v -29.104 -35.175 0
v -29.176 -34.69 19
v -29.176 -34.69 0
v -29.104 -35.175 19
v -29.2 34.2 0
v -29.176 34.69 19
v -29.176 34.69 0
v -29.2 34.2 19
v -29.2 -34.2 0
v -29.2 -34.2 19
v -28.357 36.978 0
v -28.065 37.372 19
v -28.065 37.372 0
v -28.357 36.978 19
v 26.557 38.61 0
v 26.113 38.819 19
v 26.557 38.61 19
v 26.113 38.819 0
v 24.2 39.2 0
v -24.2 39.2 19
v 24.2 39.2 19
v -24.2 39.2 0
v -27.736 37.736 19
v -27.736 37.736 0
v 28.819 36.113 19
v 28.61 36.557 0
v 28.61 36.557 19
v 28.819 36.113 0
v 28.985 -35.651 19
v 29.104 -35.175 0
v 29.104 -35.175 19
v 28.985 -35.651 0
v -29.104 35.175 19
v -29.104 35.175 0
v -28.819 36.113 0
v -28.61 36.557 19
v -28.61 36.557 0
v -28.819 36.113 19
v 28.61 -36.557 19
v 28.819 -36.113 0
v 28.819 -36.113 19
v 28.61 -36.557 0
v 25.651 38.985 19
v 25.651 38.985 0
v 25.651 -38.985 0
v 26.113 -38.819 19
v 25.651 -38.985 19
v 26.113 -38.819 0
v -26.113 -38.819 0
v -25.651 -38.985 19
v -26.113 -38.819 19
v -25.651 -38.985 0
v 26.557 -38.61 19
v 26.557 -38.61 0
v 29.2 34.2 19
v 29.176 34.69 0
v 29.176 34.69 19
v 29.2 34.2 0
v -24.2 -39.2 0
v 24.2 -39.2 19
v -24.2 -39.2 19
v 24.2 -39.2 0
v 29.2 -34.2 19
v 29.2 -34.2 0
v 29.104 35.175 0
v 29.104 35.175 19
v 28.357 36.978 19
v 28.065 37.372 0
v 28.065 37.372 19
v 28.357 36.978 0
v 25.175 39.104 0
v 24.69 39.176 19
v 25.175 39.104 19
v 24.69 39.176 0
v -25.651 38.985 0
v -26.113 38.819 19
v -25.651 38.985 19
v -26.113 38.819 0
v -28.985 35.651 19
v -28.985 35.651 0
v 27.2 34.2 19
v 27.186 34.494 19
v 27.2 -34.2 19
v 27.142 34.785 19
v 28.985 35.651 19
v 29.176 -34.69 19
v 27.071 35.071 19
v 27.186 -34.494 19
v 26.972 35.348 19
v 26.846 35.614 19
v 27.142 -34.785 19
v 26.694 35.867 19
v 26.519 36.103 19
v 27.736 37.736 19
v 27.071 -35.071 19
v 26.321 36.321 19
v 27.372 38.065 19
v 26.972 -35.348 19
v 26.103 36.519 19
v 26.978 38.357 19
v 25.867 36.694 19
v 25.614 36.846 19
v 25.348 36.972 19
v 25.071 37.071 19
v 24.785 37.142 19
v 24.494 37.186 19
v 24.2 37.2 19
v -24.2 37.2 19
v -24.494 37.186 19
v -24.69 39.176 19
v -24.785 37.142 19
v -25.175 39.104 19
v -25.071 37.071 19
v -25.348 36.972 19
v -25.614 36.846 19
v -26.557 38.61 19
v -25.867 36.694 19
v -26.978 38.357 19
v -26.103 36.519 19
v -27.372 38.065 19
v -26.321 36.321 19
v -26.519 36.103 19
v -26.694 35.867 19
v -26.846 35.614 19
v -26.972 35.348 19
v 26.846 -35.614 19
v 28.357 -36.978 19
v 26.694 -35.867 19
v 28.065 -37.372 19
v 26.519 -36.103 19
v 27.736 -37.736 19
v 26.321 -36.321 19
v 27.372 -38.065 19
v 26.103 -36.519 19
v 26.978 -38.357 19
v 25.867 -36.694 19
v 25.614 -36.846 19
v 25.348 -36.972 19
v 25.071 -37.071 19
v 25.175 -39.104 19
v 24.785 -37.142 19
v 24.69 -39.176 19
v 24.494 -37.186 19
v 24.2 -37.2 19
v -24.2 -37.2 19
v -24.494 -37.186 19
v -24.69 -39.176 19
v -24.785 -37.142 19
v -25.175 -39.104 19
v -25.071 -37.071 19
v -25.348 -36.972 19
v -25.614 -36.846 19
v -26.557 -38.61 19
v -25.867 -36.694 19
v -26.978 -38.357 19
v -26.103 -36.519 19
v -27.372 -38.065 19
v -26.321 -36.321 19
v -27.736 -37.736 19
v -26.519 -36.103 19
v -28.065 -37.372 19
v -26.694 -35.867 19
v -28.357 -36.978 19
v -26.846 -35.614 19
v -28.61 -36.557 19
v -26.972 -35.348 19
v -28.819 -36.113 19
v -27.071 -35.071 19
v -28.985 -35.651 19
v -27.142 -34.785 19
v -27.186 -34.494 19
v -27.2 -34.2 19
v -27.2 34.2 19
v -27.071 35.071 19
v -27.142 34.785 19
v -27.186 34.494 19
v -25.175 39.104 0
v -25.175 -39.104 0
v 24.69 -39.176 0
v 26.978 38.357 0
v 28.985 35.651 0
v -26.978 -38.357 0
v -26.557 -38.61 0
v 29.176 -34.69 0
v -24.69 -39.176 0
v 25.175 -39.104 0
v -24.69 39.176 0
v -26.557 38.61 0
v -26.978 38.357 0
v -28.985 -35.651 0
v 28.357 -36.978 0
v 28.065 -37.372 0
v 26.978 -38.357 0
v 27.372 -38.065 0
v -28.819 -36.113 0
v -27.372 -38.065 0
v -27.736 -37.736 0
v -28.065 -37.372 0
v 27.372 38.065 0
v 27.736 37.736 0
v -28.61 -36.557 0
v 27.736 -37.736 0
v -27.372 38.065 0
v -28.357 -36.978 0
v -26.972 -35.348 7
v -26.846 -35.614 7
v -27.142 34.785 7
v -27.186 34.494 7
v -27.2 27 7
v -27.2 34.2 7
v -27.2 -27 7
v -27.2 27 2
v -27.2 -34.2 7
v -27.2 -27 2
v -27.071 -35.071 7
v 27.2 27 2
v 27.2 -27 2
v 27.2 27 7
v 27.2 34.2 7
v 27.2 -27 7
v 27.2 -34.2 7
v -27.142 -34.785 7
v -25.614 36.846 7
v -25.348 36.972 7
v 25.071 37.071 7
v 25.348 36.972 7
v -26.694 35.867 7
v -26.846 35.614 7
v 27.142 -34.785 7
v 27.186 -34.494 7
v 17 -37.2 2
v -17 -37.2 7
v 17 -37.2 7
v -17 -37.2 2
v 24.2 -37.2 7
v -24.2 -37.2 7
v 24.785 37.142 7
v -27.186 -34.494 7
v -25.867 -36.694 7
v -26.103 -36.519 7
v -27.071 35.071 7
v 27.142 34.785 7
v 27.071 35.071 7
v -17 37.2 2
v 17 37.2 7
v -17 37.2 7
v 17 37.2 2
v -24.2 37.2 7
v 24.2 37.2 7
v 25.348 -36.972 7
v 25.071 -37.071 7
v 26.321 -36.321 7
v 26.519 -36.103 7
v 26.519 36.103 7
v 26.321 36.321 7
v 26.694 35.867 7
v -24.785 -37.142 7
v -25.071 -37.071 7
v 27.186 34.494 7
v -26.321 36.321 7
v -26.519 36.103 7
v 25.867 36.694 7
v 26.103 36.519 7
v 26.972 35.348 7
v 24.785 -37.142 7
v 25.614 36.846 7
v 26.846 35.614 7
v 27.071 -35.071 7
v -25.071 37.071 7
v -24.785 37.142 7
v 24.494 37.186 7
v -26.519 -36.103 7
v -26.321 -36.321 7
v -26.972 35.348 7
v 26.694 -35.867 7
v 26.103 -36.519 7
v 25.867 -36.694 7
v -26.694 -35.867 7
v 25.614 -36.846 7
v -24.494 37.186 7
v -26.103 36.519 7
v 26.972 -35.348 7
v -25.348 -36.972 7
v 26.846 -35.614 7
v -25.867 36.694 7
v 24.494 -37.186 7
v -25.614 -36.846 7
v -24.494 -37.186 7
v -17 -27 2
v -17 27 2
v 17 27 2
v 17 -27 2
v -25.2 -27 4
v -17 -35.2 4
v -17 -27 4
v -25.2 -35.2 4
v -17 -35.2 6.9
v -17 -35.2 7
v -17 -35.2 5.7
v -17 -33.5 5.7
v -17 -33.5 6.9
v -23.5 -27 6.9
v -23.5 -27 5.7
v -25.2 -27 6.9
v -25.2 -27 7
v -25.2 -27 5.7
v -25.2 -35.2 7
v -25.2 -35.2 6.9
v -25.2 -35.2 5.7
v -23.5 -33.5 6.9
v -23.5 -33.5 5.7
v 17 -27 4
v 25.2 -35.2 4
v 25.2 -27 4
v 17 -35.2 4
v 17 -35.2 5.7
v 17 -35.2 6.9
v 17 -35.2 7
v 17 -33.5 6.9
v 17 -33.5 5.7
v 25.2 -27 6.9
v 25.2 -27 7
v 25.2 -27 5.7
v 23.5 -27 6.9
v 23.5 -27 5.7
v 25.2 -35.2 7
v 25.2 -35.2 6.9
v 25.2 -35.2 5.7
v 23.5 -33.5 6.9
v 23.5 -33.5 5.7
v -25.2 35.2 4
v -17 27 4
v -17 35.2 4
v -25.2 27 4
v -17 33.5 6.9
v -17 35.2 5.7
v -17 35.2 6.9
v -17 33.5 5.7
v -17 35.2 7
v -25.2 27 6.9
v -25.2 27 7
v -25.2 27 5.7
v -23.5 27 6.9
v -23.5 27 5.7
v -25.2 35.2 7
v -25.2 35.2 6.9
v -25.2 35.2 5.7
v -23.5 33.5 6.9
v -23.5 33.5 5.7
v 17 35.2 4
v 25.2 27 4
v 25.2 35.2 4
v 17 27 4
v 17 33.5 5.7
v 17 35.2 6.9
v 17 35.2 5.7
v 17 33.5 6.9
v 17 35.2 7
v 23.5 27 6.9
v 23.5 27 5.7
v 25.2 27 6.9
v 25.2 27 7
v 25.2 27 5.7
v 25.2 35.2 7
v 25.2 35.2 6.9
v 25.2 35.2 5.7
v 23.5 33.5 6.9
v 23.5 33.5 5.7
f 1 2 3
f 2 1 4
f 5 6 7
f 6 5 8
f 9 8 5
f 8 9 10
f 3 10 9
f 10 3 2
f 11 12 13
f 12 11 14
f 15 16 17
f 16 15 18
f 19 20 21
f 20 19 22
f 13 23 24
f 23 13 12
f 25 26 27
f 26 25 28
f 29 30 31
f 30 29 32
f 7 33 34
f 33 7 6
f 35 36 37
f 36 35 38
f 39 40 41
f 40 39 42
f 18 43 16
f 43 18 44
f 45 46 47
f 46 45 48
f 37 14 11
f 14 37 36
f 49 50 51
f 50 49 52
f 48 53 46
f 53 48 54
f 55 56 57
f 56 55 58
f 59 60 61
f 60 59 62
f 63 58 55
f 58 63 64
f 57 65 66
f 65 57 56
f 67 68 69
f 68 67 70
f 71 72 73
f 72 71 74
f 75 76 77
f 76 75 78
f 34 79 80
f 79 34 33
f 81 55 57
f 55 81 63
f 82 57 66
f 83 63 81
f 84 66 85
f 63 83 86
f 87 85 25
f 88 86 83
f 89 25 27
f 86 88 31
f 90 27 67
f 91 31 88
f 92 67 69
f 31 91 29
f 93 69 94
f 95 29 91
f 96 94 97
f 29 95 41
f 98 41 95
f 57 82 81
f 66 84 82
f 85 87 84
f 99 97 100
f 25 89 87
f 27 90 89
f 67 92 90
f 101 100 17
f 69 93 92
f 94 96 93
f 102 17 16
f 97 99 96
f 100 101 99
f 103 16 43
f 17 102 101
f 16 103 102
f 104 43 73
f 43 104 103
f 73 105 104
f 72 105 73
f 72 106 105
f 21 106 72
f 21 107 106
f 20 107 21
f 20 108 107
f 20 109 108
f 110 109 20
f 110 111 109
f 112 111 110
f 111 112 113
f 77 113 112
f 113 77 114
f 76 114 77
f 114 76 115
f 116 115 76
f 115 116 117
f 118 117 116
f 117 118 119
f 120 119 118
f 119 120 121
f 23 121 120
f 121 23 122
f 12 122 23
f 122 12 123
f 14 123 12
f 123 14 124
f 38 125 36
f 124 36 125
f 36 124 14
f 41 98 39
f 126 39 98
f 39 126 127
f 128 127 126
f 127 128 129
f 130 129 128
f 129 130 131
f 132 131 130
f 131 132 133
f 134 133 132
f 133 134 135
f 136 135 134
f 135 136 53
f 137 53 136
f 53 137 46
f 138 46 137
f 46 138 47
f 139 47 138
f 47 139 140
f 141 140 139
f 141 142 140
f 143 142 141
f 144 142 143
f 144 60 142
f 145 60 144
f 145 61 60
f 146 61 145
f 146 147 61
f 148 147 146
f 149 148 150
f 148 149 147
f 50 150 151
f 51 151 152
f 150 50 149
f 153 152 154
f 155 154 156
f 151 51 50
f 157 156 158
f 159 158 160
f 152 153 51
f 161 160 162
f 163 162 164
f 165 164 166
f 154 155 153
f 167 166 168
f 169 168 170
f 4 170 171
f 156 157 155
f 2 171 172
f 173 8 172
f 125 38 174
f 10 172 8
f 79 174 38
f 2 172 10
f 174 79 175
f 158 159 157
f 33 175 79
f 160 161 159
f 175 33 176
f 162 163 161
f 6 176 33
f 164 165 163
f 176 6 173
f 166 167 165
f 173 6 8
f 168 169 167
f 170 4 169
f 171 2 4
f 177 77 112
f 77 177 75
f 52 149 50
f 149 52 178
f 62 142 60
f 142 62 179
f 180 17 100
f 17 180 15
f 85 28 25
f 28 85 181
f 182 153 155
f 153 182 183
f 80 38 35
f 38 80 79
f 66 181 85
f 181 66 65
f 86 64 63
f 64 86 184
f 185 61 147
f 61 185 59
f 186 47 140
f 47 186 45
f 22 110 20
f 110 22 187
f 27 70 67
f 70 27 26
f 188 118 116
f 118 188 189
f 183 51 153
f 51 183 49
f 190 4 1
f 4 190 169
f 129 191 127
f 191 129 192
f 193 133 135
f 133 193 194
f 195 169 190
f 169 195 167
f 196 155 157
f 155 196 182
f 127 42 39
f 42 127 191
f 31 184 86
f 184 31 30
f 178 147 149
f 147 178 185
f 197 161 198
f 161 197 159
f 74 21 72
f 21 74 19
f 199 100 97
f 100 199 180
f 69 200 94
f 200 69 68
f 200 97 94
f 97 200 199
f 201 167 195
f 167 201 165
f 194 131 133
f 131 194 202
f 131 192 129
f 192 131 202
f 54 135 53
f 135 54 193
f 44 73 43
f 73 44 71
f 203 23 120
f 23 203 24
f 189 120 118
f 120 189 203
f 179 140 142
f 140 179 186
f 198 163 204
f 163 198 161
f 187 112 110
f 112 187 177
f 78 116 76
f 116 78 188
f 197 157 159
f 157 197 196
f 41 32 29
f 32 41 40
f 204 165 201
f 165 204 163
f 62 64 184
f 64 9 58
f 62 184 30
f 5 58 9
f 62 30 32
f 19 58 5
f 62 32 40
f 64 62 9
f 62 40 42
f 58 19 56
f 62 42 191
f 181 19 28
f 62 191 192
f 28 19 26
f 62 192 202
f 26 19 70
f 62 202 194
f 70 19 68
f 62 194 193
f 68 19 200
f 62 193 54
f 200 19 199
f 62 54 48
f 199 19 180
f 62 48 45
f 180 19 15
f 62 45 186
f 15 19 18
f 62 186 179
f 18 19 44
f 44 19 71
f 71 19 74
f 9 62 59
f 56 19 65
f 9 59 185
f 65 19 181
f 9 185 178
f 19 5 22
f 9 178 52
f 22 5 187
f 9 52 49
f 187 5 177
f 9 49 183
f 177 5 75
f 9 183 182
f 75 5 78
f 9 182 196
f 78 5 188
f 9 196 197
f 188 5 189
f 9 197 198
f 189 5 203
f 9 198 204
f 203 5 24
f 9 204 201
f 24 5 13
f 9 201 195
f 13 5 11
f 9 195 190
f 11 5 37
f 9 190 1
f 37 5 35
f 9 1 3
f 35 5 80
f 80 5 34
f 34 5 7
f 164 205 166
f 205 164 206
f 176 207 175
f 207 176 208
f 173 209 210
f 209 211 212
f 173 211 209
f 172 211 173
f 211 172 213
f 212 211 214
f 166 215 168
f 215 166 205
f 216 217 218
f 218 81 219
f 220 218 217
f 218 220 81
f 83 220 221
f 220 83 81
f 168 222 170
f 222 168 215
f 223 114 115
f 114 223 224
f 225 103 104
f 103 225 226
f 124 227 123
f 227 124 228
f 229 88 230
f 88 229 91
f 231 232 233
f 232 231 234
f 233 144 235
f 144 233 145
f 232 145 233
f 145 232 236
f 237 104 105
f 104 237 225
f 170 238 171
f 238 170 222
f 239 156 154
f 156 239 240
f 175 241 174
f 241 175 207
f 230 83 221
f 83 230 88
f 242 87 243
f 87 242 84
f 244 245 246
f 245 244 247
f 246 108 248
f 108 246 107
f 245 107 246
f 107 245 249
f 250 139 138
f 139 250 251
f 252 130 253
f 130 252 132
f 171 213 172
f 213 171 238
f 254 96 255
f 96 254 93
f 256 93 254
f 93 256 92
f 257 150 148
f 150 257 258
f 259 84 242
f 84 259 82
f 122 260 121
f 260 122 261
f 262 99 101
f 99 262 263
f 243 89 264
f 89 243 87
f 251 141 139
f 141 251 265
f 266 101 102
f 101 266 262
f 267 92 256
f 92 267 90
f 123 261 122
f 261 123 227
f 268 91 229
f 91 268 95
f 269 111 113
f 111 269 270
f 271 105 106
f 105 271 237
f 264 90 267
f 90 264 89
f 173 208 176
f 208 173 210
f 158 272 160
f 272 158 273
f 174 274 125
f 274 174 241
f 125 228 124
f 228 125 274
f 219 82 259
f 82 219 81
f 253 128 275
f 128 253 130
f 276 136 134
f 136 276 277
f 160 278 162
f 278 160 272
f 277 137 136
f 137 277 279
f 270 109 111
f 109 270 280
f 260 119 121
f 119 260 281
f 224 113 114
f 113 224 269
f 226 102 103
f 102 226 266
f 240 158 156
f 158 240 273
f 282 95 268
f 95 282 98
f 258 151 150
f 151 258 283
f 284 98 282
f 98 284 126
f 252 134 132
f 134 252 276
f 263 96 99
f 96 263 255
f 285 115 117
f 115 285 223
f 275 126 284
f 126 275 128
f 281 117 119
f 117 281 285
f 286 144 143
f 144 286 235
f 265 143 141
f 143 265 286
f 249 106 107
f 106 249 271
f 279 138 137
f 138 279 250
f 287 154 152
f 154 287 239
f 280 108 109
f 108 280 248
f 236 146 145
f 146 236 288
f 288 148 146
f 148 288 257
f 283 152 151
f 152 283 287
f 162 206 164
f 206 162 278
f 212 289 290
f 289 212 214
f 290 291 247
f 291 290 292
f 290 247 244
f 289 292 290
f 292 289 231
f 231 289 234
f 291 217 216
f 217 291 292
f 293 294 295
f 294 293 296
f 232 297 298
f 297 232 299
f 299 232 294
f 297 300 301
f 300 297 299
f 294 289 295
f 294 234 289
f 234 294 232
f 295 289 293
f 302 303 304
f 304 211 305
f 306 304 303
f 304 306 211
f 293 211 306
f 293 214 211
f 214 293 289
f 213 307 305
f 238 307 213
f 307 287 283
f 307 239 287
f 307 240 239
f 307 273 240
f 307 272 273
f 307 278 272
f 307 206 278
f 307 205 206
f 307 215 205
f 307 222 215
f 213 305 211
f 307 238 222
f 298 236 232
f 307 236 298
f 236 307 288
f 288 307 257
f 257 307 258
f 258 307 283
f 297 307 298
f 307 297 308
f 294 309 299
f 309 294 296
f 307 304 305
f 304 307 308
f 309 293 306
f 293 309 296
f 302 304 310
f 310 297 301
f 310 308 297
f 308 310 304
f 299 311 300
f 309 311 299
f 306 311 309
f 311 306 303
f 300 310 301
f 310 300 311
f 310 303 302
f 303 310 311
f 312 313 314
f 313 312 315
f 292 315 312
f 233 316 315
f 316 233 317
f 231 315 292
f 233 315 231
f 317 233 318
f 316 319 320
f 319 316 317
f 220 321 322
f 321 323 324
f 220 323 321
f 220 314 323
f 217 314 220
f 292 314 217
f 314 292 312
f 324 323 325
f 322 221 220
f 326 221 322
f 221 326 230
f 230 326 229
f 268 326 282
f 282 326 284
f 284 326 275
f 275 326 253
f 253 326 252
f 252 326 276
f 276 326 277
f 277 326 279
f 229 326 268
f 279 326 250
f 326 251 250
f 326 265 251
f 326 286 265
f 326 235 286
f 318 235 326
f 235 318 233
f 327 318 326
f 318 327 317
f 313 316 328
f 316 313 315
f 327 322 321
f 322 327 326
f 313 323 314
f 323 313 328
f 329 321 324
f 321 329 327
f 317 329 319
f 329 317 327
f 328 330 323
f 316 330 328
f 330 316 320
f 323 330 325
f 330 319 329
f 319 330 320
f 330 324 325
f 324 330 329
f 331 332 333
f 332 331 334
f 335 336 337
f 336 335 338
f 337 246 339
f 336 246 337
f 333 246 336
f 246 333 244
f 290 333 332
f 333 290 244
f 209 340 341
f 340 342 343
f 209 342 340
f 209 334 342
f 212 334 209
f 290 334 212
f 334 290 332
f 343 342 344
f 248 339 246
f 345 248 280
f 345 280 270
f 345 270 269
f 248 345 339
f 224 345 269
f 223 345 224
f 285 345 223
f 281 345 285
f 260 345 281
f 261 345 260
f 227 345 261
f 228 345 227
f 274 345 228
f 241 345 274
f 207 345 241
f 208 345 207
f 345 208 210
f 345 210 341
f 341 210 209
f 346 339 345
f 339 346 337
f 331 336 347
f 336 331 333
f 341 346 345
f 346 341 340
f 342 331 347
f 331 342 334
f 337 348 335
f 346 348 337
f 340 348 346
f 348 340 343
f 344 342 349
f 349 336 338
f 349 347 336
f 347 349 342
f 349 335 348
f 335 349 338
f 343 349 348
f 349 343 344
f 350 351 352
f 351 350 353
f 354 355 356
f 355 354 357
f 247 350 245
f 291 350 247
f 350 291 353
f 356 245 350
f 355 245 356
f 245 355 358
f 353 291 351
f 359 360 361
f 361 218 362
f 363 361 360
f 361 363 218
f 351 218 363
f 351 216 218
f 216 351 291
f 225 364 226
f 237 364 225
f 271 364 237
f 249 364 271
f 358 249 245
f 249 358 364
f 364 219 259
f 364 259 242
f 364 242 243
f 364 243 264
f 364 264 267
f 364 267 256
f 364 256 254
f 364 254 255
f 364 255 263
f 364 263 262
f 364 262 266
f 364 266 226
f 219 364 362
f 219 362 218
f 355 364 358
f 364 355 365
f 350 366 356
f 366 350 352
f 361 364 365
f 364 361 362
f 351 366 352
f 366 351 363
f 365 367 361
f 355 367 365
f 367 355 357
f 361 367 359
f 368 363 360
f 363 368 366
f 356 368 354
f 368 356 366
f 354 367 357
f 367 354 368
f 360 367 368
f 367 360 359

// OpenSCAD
// file: example_config.scad
// ============================================================
//  example_config.scad — constants for the starter enclosure.
//
//  `include`d (not `use`d) by the pieces, so these are plain variables.
//  No geometry here, and no self-preview: an `include` would leak it into
//  every importer.
//
//  Every constant carries its provenance: MEASURED = verified with calipers
//  against the real part; ADJUST = an estimate, to be confirmed. Flip the tag
//  in place when the measurement arrives, and never delete the trail.
// ============================================================

// ---- the board this box houses ---------------------------------------------
// The defaults of the pcb_holder component: a generic 50 × 70 board. Swap these
// for your own and everything below follows.
BOX_PCB_W = 50;   // ADJUST: PCB width  (X, mm)
BOX_PCB_L = 70;   // ADJUST: PCB length (Y, mm)
BOX_PCB_T = 1.5;  // ADJUST: PCB thickness (mm)

// ---- what the component reserves around the board --------------------------
// pcb_holder puts an L-shaped wall of PCBH_WALL outside each PCB corner, with
// PCBH_FIT of play per side. The cavity has to clear both, or the holders would
// not fit inside their own box.
BOX_FIT         = 0.2;  // ADJUST: XY play between PCB edge and holder (per side) = PCBH_FIT
BOX_HOLDER_WALL = 2;    // ADJUST: holder outer wall = PCBH_WALL
BOX_HOLDER_H    = 5.0;  // ADJUST: total holder height, = pcb_holder_height() with the
                        // component defaults (standoff 2 + ref PCB 1.6 + slot 0.2 + lip 1.2).
                        // Mirrored here, so revisit it if the component's defaults move.

// ---- the enclosure ---------------------------------------------------------
BOX_WALL     = 2;    // ADJUST: outer wall thickness (mm)
BOX_FLOOR    = 2;    // ADJUST: floor thickness (mm)
BOX_HEADROOM = 12;   // ADJUST: free height above the holder lip, for tall components
BOX_CORNER_R = 3;    // ADJUST: inner corner radius in plan (mm)

// ---- the lid ---------------------------------------------------------------
BOX_LID_T   = 2;     // ADJUST: lid plate thickness (mm)
BOX_LIP_H   = 3;     // ADJUST: depth the lid lip plugs into the cavity (mm)
BOX_LIP_T   = 1.5;   // ADJUST: wall thickness of that lip — it is a rim, not a slab
BOX_LID_CL  = 0.25;  // ADJUST: play of that lip against the cavity wall (per side)

BOX_EPS = 0.05;      // local manifold fudge: overhang for cutters, overlap for unions

// ---- derived (functions, so `use` can read them from another file) ----------
// Cavity = board + the component's own footprint. Everything else hangs off this.
function box_cav_w() = BOX_PCB_W + 2 * (BOX_FIT + BOX_HOLDER_WALL);
function box_cav_l() = BOX_PCB_L + 2 * (BOX_FIT + BOX_HOLDER_WALL);
function box_cav_h() = BOX_HOLDER_H + BOX_HEADROOM;

function box_outer_w() = box_cav_w() + 2 * BOX_WALL;
function box_outer_l() = box_cav_l() + 2 * BOX_WALL;

// z of the rim the lid lands on (top of the base walls).
function box_rim_z() = BOX_FLOOR + box_cav_h();
// main file
// ============================================================
//  base.scad — the tray of the starter enclosure: a rounded shell, open on
//  top, with the PCB retainers standing on its floor.
//
//  This is the piece that shows the three layers working together:
//    · lib/rounded.scad     → the shell (a generic primitive)
//    · components/pcb_holder → the retainers (a concrete reusable part)
//    · this file             → the design that combines them
//
//  Frame: XY centred on the PCB, z = 0 at the bottom of the box (the print bed).
//  Piece, not a front door: it does NOT set $fn — main.scad does.
// ============================================================

use <../../../lib/rounded.scad>
use <../../../components/pcb_holder.scad>
include <example_config.scad>

// Invariants. They live in a module and get CALLED from the geometry, because
// OpenSCAD skips top-level statements of a file imported with `use` — an assert
// in the header would be silently ignored exactly when it matters.
module _box_asserts() {
    assert(BOX_HOLDER_H == pcb_holder_height(pcb_t = BOX_PCB_T),
           "BOX_HOLDER_H no longer matches pcb_holder_height() — the component moved; re-read its defaults and update the constant (the drawing needs it as a literal).");
}

// The tray: shell minus the cavity, plus the retainers on the floor.
module base() {
    _box_asserts();
    difference() {
        // Outer shell. The outer radius follows the inner one so the wall keeps
        // a constant thickness all the way round the corner.
        translate([0, 0, box_rim_z() / 2])
            rounded_flat_cube(box_outer_w(), box_outer_l(), box_rim_z(),
                              BOX_CORNER_R + BOX_WALL);

        // Cavity, open at the top: the cutter pokes BOX_EPS past the rim so the
        // opening is a real hole and not a coplanar face.
        translate([0, 0, BOX_FLOOR + (box_cav_h() + BOX_EPS) / 2])
            rounded_flat_cube(box_cav_w(), box_cav_l(), box_cav_h() + BOX_EPS,
                              BOX_CORNER_R);
    }

    // The retainers. Their own frame has z = 0 at the host floor, so they get
    // lifted by the floor thickness; the component does the rest.
    translate([0, 0, BOX_FLOOR])
        pcb_holder(width = BOX_PCB_W, length = BOX_PCB_L, pcb_t = BOX_PCB_T);
}

// ---------- Self-preview (top-level; `use <...>` ignores it) ----------
// Opening this file on its own in OpenSCAD shows geometry, not an empty canvas.
// $fn goes here because outside main.scad it is not inherited.
$fn = 64;
base();
